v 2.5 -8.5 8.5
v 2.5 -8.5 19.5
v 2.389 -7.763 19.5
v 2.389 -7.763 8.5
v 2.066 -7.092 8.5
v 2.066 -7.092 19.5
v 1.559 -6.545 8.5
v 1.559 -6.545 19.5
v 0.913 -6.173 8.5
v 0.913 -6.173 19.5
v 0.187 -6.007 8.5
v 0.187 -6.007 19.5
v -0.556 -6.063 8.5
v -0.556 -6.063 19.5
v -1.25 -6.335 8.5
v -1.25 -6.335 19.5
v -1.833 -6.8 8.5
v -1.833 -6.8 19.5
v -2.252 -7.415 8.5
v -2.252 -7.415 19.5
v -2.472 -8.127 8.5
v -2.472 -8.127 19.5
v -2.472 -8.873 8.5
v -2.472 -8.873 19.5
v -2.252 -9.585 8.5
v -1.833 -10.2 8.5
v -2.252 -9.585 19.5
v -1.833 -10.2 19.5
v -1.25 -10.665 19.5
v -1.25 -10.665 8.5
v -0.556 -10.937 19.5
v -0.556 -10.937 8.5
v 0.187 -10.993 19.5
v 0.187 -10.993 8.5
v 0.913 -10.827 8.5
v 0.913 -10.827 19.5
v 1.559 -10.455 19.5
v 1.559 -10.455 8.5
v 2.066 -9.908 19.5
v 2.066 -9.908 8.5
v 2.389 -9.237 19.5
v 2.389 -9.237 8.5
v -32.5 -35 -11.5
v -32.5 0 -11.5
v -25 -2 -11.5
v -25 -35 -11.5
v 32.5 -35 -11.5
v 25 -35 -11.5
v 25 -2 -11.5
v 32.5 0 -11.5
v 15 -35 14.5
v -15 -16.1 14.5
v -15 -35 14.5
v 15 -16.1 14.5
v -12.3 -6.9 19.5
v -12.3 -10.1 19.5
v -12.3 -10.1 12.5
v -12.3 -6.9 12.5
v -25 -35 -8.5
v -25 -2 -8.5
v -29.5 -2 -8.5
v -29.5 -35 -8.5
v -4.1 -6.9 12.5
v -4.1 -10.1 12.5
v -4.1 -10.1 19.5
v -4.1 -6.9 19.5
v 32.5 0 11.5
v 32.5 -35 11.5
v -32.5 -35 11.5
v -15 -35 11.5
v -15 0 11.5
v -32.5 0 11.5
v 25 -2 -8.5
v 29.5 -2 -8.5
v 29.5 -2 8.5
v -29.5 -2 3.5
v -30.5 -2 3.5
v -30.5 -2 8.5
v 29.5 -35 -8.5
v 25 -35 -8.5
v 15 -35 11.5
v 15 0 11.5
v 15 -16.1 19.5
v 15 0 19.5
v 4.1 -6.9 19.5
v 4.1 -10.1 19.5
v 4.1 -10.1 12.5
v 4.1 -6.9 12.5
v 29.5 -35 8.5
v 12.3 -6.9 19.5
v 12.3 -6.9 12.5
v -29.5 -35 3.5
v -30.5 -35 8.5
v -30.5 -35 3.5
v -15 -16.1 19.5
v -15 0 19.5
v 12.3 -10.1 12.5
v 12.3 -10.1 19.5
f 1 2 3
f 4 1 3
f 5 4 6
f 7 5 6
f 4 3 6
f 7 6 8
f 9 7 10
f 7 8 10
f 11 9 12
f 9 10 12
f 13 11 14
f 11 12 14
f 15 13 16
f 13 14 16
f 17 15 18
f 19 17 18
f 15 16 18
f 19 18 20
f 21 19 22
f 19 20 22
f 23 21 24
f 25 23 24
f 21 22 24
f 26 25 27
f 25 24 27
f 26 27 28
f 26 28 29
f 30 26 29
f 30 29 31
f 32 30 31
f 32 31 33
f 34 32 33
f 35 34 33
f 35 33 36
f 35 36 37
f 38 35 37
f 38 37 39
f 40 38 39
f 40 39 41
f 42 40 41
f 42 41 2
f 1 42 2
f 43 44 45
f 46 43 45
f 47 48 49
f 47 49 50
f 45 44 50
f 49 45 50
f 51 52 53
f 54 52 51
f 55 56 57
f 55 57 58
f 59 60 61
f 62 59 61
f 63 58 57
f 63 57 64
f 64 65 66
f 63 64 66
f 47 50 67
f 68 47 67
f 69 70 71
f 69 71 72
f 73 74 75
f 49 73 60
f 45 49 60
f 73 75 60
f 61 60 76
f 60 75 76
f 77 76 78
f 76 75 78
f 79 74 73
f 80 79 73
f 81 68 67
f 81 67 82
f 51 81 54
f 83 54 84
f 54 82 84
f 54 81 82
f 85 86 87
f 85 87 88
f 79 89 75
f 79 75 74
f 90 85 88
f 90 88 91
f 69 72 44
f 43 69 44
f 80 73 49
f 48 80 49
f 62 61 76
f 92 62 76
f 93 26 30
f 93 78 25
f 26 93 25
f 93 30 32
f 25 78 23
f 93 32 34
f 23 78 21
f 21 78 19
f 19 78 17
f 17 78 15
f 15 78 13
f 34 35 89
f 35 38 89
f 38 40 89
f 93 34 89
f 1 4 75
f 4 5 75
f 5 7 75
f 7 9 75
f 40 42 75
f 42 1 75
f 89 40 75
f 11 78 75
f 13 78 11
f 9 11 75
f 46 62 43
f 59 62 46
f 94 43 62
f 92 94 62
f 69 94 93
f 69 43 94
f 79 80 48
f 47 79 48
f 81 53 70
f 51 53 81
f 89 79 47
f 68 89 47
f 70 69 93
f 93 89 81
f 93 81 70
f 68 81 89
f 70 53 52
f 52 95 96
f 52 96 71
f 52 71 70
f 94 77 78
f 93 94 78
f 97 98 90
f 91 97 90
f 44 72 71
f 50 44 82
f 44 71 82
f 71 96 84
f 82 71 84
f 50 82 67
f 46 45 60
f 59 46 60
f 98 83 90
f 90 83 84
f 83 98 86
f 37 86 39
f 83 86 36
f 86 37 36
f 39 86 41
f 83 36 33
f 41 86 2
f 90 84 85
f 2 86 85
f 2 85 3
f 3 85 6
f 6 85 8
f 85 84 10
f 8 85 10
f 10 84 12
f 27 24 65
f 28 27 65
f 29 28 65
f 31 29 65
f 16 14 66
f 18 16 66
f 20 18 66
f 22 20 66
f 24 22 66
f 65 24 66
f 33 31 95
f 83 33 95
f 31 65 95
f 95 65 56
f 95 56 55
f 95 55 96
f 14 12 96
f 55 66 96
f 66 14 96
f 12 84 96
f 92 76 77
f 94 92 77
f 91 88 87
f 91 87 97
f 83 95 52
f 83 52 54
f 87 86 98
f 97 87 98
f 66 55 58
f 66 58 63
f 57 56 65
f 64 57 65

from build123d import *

# Parameters (mm, degrees)
F1_DEPTH = 35
F3_DEPTH = 2
F4_R     = 2.5
F5_DEPTH = 25
F6_W     = 8.2
F6_H     = 3.2
F7_DEPTH = 7
F8_W     = 30
F8_H     = 18.9
F9_DEPTH = 5


with BuildPart() as f1:
    # F0 (on Front) → F1 (new body)
    with BuildSketch(Plane.XZ):
        Polygon((-15, 11.5), (-32.5, 11.5), (-32.5, -11.5), (-25, -11.5), (-25, -8.5), (-29.5, -8.5), (-29.5, 3.5), (-30.5, 3.5), (-30.5, 8.5), (-29.5, 8.5), (29.5, 8.5), (29.5, -8.5), (25, -8.5), (25, -11.5), (32.5, -11.5), (32.5, 11.5), (15, 11.5), (15, 19.5), (0, 19.5), (-15, 19.5), align=None)
    extrude(amount=F1_DEPTH)

    # F2 (on face) → F3 (join)
    with BuildSketch(Plane(origin=(0, 0, 0), x_dir=(-1, 0, 0), z_dir=(0, 1, 0))):
        Polygon((-15, 11.5), (-32.5, 11.5), (-32.5, -11.5), (-25, -11.5), (25, -11.5), (32.5, -11.5), (32.5, 11.5), (15, 11.5), (15, 19.5), (-15, 19.5), align=None)
    extrude(amount=-F3_DEPTH)

    # F4 (on face) → F5 (cut)
    with BuildSketch(Plane.XY.offset(19.5)):
        with Locations((0, -8.5)):
            Circle(F4_R)
    extrude(amount=-F5_DEPTH, mode=Mode.SUBTRACT)

    # F6 (on face) → F7 (cut)
    with BuildSketch(Plane.XY.offset(19.5)):
        with Locations((-8.2, -8.5)):
            Rectangle(F6_W, F6_H)
        with Locations((8.2, -8.5)):
            Rectangle(F6_W, F6_H)
    extrude(amount=-F7_DEPTH, mode=Mode.SUBTRACT)

    # F8 (on face) → F9 (cut)
    with BuildSketch(Plane.XY.offset(19.5)):
        with Locations((0, -25.55)):
            Rectangle(F8_W, F8_H)
    extrude(amount=-F9_DEPTH, mode=Mode.SUBTRACT)


solid = f1.part
